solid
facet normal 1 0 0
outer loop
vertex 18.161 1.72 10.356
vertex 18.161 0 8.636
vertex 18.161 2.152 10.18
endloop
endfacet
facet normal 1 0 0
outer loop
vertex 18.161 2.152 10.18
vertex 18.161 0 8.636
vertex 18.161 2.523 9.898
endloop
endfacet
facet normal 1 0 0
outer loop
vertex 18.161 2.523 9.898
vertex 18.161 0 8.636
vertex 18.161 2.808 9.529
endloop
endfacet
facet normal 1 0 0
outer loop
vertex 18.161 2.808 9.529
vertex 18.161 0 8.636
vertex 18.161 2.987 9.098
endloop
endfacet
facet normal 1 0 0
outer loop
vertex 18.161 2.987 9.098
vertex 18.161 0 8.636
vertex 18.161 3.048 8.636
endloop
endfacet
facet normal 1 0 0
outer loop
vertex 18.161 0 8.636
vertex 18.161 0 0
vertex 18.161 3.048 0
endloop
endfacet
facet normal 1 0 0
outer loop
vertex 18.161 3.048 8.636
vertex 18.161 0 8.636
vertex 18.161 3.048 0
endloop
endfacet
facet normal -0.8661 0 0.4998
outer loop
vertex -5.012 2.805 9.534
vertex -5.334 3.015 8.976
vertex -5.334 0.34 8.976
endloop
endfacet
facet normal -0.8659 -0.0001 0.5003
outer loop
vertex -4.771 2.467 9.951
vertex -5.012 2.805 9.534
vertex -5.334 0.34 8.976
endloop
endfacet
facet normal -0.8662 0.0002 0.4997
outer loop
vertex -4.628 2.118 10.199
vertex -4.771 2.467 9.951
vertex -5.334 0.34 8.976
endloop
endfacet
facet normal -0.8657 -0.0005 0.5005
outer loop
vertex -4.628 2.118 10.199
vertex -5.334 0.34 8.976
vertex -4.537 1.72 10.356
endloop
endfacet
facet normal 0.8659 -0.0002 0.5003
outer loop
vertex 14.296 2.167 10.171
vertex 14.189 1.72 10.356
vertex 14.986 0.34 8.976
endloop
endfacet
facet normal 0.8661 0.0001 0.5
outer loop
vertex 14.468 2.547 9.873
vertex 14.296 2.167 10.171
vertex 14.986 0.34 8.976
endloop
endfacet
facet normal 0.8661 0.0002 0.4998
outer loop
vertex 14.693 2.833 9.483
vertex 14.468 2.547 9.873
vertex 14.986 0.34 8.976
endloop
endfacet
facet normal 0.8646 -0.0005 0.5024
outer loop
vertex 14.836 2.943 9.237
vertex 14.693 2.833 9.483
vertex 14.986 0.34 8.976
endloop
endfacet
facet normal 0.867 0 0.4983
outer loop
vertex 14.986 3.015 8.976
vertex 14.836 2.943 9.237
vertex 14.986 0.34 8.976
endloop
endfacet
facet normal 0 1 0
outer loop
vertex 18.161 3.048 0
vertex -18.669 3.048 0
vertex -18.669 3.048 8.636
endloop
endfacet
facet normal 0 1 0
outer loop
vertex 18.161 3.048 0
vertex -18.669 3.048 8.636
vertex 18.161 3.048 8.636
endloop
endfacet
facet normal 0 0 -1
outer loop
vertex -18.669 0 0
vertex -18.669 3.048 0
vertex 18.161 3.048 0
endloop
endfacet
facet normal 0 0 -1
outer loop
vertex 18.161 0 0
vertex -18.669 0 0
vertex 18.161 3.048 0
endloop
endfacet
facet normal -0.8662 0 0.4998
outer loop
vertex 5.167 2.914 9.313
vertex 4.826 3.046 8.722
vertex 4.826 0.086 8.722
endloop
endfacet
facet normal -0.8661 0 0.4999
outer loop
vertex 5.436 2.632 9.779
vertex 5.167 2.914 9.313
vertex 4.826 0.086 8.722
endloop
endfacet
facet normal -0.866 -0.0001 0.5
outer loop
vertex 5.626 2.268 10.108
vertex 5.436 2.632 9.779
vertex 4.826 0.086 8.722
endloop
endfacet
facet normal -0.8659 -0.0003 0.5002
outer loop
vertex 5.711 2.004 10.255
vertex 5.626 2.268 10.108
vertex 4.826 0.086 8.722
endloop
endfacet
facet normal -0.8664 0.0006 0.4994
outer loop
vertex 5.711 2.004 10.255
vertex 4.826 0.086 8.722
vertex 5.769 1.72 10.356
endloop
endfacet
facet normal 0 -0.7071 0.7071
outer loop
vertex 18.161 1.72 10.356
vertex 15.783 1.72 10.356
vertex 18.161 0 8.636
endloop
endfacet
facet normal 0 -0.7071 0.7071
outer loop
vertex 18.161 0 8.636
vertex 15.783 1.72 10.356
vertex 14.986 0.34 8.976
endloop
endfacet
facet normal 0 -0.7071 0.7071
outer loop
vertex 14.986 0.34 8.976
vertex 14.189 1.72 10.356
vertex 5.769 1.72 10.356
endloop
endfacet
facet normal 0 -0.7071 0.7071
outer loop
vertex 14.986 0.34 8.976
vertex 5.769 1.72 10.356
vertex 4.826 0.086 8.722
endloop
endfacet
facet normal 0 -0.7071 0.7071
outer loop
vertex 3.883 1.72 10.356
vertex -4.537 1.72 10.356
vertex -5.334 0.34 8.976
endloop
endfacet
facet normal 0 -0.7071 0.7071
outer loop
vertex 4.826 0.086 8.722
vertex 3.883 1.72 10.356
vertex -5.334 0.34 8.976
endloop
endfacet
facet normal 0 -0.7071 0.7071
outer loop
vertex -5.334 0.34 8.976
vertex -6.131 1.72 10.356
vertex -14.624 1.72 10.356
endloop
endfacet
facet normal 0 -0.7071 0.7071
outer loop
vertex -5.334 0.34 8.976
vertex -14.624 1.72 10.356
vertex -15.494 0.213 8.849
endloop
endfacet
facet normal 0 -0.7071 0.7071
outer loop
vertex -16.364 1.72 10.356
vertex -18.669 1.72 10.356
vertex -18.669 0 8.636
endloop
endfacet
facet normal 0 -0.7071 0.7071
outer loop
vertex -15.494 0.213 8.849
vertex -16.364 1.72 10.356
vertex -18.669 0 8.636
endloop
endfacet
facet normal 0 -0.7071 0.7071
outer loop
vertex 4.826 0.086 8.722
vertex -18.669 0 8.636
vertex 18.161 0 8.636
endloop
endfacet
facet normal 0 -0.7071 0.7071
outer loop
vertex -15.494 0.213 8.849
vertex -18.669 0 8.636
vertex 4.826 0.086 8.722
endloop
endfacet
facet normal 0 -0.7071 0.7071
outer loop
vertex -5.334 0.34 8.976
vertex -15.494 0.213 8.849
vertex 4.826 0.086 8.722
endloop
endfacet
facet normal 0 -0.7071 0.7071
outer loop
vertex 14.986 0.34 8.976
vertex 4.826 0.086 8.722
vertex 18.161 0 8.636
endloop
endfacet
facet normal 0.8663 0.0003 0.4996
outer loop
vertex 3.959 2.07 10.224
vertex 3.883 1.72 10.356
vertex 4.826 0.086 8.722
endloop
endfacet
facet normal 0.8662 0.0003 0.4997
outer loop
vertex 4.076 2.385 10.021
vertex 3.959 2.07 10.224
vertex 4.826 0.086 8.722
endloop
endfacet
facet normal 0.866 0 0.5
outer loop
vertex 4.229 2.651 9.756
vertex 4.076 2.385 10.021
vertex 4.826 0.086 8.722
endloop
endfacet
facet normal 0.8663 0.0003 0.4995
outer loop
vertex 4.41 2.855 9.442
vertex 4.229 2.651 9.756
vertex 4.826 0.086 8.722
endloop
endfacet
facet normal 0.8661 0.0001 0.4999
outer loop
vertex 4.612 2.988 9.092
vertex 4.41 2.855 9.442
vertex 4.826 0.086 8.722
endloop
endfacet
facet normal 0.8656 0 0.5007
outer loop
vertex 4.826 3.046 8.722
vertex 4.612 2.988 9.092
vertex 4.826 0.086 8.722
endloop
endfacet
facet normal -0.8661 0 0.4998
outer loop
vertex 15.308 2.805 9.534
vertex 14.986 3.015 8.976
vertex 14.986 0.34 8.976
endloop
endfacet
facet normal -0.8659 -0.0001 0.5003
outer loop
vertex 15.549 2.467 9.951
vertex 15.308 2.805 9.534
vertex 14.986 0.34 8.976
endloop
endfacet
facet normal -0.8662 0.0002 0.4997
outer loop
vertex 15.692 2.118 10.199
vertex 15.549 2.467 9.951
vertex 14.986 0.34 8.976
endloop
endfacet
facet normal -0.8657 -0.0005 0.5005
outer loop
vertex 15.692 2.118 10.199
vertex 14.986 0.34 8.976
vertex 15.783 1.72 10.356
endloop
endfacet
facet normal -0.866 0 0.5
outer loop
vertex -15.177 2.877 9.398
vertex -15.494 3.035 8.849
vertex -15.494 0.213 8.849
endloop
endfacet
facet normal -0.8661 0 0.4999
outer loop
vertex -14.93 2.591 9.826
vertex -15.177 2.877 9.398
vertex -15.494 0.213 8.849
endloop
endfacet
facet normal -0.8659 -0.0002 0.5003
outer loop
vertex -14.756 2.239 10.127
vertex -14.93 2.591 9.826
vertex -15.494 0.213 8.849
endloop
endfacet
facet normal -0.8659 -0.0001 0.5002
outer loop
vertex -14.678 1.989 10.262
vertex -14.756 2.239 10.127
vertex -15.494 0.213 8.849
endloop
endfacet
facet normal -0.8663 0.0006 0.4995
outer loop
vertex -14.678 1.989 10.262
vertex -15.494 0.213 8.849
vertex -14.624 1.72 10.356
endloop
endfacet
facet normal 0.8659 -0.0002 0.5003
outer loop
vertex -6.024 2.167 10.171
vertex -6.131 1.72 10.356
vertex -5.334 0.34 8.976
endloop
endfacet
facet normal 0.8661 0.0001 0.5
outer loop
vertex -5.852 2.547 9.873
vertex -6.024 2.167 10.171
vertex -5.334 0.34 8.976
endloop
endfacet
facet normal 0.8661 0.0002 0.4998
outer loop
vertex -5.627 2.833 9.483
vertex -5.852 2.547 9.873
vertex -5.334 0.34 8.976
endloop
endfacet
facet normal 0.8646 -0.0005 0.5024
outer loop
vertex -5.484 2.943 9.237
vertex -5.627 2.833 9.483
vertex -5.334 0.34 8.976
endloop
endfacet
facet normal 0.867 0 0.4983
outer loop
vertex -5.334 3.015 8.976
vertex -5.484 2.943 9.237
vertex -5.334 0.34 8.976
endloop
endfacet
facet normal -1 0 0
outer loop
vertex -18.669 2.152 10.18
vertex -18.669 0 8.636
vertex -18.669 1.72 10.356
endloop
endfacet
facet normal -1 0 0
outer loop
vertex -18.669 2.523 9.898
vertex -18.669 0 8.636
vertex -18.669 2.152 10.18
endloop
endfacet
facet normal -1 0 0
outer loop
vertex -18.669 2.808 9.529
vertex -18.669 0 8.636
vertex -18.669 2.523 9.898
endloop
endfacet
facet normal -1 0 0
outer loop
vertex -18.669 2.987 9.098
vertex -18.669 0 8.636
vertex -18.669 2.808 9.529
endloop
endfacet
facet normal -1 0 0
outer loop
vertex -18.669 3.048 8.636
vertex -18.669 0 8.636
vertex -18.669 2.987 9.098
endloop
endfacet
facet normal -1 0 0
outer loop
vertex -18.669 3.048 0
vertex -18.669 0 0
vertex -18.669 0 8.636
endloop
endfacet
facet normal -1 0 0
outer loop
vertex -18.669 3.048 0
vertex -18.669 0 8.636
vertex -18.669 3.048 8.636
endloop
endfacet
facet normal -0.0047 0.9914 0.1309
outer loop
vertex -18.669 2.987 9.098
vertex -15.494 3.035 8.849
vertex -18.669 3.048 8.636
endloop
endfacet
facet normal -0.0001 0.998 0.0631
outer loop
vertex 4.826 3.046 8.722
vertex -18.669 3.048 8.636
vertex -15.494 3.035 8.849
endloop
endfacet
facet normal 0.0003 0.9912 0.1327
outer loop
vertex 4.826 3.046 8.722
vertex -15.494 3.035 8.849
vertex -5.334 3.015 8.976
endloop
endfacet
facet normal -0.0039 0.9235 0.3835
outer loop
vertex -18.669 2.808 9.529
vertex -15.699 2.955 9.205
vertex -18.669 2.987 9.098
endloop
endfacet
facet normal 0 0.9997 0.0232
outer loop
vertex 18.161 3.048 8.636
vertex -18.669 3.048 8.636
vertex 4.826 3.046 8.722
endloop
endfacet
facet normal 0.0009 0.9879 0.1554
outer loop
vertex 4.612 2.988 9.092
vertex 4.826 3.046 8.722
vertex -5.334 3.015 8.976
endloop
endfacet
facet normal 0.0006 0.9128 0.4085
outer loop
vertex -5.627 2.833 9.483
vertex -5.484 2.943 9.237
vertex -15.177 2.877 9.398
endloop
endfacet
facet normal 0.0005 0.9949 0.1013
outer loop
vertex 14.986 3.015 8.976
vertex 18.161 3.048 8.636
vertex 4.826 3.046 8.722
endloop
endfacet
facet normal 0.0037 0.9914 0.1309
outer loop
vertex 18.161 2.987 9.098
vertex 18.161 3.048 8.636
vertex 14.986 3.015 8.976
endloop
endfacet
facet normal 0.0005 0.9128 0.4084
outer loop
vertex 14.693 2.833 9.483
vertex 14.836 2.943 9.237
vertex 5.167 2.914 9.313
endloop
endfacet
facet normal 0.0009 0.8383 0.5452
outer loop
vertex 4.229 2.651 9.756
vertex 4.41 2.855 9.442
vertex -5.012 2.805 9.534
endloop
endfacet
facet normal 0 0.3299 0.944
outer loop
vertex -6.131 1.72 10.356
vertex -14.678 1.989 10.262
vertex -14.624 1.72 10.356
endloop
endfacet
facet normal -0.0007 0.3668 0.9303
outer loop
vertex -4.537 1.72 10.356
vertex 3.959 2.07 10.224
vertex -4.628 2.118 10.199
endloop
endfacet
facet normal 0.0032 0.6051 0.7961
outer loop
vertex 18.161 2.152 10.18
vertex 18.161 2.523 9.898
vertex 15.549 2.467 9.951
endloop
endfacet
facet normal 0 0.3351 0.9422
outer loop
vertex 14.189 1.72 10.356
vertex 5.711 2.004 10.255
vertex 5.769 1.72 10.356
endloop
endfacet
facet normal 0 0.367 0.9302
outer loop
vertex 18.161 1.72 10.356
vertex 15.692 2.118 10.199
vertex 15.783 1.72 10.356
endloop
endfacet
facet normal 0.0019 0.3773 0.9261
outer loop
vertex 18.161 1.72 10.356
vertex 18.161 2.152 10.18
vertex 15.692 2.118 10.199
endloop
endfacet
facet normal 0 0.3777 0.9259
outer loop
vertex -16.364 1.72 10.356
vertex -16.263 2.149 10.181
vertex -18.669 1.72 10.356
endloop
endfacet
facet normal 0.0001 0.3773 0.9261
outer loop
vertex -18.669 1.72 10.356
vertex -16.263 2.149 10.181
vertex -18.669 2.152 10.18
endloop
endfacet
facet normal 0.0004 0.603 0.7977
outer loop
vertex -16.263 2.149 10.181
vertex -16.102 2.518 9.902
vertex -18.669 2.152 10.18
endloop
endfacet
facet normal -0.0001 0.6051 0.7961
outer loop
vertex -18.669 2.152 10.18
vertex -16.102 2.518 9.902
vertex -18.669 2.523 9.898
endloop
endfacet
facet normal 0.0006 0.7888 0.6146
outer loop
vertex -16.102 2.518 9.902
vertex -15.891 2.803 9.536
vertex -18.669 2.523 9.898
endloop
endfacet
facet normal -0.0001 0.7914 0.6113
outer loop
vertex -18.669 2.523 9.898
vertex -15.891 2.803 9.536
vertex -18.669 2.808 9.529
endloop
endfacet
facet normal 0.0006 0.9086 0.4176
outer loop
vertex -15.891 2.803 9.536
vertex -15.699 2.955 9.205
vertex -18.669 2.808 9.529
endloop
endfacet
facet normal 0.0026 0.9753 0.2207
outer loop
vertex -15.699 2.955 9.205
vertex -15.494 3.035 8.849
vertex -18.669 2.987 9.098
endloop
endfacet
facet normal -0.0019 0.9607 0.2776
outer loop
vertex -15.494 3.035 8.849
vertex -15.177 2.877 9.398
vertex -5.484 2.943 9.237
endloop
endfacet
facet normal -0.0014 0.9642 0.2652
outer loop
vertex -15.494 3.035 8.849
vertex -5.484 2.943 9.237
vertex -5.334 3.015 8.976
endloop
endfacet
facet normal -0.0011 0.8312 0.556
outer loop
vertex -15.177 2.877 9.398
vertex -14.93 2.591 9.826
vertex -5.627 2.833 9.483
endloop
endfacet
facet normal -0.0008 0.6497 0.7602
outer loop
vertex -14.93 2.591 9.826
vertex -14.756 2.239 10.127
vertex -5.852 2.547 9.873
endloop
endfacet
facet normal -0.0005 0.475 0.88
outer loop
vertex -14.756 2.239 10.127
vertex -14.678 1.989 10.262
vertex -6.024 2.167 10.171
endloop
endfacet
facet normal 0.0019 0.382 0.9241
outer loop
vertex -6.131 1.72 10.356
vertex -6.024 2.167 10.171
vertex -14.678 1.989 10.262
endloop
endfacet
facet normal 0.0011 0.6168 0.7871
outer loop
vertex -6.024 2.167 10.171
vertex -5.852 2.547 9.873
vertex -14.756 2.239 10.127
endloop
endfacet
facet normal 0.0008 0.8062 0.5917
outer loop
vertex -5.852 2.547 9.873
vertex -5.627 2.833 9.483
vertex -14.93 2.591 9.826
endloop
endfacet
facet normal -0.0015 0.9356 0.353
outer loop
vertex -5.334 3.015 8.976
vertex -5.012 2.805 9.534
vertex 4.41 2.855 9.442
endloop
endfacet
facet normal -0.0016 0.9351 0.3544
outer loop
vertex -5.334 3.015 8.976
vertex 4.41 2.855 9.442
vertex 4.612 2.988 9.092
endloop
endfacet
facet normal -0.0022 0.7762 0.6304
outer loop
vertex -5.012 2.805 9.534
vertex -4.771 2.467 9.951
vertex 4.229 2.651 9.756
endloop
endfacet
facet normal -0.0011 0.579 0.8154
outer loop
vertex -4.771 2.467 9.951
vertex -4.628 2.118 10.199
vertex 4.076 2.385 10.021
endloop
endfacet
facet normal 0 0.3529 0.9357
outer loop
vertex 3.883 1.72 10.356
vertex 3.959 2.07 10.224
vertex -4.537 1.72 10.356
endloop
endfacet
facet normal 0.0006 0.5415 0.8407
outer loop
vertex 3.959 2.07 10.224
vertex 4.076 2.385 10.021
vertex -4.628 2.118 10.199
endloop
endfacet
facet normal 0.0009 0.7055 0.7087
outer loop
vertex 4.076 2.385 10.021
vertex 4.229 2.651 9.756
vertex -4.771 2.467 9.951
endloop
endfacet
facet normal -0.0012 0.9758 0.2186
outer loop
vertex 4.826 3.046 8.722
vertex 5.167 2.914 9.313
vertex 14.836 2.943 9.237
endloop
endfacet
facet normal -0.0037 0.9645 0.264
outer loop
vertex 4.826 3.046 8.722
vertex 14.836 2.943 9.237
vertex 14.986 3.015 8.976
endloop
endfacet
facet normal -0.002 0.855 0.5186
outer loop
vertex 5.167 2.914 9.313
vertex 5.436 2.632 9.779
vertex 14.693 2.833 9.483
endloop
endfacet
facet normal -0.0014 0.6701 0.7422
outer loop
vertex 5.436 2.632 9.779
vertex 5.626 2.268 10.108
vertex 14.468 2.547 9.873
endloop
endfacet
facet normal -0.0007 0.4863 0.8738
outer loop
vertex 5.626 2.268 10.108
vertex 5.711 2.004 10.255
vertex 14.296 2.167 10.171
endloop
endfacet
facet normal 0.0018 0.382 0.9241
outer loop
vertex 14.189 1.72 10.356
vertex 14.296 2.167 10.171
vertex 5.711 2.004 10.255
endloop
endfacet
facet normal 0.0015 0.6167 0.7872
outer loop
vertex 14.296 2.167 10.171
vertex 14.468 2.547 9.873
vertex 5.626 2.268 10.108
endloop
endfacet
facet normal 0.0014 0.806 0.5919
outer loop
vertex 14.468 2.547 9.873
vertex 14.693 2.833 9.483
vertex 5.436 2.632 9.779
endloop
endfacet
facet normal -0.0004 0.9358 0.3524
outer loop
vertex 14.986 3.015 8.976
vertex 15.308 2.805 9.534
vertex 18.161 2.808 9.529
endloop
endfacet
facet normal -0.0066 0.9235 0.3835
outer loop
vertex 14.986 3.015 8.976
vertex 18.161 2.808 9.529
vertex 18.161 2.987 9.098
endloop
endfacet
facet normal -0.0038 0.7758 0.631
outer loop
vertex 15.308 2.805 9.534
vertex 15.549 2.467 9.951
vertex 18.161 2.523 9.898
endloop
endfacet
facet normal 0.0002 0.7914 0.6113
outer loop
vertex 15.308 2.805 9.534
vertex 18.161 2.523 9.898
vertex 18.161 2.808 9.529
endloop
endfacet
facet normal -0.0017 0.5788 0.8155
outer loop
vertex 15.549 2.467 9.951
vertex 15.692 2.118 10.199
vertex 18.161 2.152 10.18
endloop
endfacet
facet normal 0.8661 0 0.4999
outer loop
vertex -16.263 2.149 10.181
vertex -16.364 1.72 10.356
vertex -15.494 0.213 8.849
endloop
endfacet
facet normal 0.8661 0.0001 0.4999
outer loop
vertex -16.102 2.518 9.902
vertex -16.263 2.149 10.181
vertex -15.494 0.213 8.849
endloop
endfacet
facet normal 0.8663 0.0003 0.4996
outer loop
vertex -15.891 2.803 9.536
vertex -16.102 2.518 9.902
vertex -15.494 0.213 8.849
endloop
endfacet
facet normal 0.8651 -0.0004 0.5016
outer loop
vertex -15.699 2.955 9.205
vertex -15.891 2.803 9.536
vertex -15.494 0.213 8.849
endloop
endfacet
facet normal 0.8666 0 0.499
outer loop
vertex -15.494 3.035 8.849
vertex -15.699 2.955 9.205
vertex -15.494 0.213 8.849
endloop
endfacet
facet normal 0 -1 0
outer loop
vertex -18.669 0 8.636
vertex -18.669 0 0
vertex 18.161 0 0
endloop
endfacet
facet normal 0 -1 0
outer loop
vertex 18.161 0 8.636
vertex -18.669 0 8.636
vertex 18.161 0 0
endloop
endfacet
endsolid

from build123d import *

# Parameters (mm, degrees)
F0_W        = 36.83
F0_H        = 3.048
F1_DEPTH    = 10.414
F3_R        = 1.778
F4_T1_DEPTH = 45.9749047052
F5_DEPTH    = 25.4


# Not quite as in the source:
# - a fillet or chamfer that OpenCascade refuses, or shapes differently, is made with other operations: its cross-section is extruded or revolved along the edge and cut away or added


with BuildPart() as f1:
    # F0 (on Top) → F1 (new body)
    with BuildSketch(Plane.XY):
        with Locations((-0.254, 1.524)):
            Rectangle(F0_W, F0_H)
    extrude(amount=F1_DEPTH)

    # F3
    f3_edges = [f1.edges().sort_by_distance(p)[0] for p in [
        (-0.254, 3.048, 10.414),
    ]]
    fillet(f3_edges, radius=F3_R)

    # F4: chamfer of 1.778 on 1 edges, made by hand

    # F4_s2 → F4_t1 (cut)
    with BuildSketch(Plane.YZ.offset(-23.2414523526)):
        Polygon((1.778, 10.414), (0, 8.636), (0, 10.414), align=None)
    extrude(amount=F4_T1_DEPTH, mode=Mode.SUBTRACT)

    # F2 (on face) → F5 (cut)
    with BuildSketch(Plane.XZ):
        Polygon((-15.494, 8.8492954744), (-14.5906174209, 10.414), (-16.3973825791, 10.414), align=None)
        Polygon((-4.5039409051, 10.414), (-6.1640590949, 10.414), (-5.334, 8.9762954744), align=None)
        Polygon((5.8027060633, 10.414), (3.8492939367, 10.414), (4.826, 8.7222954744), align=None)
        Polygon((15.8160590949, 10.414), (14.1559409051, 10.414), (14.986, 8.9762954744), align=None)
    extrude(amount=-F5_DEPTH, mode=Mode.SUBTRACT)


solid = f1.part
